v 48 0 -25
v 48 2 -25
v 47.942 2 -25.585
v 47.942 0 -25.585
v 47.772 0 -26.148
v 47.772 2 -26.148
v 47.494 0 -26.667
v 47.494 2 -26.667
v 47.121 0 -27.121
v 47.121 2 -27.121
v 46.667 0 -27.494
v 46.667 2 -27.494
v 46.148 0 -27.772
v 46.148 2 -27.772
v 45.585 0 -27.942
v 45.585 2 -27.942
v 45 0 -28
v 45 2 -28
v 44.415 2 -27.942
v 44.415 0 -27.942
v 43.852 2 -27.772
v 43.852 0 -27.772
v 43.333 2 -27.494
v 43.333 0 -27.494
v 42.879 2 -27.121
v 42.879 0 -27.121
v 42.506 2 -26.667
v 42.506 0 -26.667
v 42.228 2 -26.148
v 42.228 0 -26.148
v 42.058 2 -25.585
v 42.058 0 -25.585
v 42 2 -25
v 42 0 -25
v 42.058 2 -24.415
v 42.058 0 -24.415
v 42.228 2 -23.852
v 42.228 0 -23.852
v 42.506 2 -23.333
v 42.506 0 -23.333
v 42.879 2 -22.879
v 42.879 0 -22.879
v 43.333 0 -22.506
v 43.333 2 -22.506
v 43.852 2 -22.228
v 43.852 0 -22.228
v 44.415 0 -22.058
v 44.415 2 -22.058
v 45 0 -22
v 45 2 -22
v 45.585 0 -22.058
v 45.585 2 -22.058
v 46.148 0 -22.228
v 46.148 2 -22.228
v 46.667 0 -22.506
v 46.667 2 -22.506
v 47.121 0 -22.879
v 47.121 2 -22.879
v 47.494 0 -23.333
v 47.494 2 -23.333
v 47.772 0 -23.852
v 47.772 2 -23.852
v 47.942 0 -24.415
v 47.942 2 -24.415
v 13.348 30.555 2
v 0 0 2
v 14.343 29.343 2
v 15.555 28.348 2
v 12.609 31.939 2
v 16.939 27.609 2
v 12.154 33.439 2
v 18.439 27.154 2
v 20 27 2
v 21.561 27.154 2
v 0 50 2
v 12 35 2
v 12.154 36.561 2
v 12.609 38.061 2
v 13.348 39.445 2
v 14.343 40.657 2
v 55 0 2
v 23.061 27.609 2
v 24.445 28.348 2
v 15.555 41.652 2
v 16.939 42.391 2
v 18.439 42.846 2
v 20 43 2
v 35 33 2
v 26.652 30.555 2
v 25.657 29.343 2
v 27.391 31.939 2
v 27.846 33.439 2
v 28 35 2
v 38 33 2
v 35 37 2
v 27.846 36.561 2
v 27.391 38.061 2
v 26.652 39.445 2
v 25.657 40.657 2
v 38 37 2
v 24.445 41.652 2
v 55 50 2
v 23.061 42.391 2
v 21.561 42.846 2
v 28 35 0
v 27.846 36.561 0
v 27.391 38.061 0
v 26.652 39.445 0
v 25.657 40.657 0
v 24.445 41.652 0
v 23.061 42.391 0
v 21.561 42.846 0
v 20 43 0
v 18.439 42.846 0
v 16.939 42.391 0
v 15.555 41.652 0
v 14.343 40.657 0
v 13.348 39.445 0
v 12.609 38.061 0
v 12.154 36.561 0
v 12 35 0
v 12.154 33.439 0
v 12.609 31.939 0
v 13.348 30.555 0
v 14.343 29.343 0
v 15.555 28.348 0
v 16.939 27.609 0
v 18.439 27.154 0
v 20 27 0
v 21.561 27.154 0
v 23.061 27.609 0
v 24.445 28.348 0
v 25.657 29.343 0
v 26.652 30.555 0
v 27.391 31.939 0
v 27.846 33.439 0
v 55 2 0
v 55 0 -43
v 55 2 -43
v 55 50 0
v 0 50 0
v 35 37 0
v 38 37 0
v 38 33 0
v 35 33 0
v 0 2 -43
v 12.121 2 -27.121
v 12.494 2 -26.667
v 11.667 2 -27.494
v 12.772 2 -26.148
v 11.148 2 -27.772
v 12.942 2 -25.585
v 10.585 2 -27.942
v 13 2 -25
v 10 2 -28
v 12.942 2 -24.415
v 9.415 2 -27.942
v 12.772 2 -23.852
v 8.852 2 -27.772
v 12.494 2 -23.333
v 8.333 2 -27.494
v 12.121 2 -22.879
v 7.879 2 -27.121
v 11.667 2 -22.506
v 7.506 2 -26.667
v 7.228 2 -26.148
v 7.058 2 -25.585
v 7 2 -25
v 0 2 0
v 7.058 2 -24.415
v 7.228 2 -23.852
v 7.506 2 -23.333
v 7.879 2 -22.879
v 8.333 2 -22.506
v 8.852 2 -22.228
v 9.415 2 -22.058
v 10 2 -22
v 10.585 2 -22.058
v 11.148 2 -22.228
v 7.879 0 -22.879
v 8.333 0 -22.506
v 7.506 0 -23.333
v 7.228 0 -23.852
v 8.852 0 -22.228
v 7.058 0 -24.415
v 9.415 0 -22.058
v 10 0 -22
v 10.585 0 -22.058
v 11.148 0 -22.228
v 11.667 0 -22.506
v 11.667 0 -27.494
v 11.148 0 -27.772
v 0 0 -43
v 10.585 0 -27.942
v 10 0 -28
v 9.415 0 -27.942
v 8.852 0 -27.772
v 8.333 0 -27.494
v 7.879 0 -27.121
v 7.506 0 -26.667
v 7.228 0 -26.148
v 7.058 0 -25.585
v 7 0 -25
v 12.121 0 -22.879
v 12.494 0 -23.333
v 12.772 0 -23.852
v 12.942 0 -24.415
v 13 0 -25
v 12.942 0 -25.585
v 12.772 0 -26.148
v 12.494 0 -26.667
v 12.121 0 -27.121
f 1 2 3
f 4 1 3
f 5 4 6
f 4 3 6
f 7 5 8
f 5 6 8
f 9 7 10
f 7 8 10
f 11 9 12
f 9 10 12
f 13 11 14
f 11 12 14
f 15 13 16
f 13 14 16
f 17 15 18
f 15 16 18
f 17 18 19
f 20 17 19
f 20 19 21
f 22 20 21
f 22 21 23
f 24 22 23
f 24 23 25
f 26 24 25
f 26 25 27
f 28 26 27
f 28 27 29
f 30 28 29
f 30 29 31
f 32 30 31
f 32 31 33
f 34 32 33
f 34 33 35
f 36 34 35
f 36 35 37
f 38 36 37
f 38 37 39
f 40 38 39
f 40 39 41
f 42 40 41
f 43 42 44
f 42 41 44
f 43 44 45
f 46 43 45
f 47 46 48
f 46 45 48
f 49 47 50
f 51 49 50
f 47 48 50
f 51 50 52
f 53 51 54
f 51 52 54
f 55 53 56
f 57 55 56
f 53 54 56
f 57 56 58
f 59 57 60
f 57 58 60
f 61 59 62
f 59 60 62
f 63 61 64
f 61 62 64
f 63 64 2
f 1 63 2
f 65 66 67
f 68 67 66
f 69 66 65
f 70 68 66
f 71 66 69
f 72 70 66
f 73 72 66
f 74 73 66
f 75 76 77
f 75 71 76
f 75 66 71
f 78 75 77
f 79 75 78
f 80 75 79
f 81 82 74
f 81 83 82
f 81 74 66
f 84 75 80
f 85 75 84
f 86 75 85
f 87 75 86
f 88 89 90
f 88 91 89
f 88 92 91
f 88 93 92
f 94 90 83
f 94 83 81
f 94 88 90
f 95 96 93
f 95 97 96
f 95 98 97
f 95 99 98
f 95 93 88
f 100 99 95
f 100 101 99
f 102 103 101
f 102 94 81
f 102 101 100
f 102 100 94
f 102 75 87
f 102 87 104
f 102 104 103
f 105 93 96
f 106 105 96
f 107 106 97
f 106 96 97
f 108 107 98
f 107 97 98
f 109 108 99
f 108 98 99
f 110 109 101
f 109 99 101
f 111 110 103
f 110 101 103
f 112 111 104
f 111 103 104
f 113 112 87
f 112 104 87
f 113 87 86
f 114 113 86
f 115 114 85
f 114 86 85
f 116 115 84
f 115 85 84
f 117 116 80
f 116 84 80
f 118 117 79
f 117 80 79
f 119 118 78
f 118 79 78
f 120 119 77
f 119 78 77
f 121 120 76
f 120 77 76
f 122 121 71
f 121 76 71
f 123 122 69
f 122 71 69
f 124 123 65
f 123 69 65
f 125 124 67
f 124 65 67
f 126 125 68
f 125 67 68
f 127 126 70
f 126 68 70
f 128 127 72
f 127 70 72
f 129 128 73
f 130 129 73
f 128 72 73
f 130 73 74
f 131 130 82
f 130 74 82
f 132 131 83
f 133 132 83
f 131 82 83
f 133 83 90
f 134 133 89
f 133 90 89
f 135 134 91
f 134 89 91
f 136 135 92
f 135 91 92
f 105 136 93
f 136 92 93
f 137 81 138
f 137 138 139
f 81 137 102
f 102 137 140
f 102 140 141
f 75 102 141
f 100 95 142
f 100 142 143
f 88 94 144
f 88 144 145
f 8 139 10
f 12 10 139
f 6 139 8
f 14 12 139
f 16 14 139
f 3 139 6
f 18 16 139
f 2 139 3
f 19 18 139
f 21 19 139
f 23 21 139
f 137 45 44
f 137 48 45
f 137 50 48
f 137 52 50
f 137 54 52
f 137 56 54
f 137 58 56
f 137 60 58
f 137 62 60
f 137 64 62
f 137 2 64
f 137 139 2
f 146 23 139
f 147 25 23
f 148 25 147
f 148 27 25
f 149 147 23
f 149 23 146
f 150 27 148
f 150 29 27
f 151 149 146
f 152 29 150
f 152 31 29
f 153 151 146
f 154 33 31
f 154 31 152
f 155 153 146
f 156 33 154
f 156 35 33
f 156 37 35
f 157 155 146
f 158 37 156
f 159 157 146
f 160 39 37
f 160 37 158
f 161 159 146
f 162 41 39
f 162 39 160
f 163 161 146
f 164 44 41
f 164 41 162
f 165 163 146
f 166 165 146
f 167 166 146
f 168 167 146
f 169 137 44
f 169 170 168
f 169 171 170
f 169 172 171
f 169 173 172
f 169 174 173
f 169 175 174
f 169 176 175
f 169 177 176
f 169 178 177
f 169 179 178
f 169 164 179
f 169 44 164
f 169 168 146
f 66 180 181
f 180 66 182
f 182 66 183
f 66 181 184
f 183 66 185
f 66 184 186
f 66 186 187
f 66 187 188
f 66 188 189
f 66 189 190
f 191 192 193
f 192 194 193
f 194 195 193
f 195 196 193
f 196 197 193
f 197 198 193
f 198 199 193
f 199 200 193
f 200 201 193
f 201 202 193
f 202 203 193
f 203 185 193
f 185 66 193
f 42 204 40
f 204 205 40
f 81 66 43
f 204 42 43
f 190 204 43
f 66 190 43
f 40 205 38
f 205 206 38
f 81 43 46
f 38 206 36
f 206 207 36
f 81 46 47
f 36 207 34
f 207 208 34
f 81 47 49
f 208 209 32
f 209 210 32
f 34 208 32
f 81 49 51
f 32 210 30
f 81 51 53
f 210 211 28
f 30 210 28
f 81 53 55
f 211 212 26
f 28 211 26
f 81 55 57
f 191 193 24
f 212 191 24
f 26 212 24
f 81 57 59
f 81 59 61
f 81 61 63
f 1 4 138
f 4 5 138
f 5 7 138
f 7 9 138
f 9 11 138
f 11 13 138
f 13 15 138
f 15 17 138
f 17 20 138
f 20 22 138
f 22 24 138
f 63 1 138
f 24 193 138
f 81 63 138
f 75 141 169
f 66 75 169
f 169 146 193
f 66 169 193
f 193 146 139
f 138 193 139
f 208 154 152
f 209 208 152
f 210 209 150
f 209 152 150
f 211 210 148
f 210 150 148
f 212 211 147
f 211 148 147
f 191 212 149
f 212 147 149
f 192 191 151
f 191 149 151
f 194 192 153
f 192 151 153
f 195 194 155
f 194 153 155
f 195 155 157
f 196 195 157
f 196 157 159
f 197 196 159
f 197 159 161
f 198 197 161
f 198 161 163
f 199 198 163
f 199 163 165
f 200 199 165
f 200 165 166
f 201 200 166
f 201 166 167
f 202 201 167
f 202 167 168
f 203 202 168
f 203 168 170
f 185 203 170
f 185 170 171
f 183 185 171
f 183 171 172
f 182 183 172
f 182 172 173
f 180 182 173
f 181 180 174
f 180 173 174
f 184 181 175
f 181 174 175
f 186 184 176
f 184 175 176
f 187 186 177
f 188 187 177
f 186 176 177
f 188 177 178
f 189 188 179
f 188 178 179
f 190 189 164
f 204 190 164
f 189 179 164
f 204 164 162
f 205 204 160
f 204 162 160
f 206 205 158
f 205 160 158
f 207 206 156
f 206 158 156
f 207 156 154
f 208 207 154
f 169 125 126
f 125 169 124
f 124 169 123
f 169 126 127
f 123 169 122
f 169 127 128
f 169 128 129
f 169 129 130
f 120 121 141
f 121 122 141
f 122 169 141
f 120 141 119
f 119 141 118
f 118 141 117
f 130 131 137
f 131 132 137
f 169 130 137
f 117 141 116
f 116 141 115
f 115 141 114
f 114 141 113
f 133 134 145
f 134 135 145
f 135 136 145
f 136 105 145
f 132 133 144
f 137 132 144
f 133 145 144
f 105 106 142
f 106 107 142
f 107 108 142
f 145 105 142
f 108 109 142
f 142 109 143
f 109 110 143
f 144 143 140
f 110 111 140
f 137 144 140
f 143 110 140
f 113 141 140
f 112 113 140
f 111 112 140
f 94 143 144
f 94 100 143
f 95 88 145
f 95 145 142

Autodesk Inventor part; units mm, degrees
ref_plane "YZ Plane" through (0, 0, 0) normal (1, 0, 0) x (0, 1, 0)
ref_plane "XZ Plane" through (0, 0, 0) normal (0, 1, 0) x (-1, 0, 0)
ref_plane "XY Plane" through (0, 0, 0) normal (0, 0, 1) x (1, 0, 0)
sketch "Sketch1" plane through (0, 0, 0) normal (0, 0, 1) x (1, 0, 0)
  line L0 (0, 0) -> (55, 0)
  line L1 (55, 0) -> (55, 50)
  line L2 (55, 50) -> (0, 50)
  line L3 (0, 50) -> (0, 0)
  dimension "d3" = 55
  dimension "d4" = 50
extrude "Extrusion1" add sketch "Sketch1" along normal blind 2
sketch "Sketch2" plane through (0, 0, 2) normal (0, 0, 1) x (1, 0, 0)
  circle A0 centre (20, 35) radius 8
  line L0 (0, 0) -> (55, 0) projected
  line L1 (0, 50) -> (0, 0) projected
  line L2 (35, 37) -> (38, 37)
  line L3 (38, 37) -> (38, 33)
  line L4 (38, 33) -> (35, 33)
  line L5 (35, 33) -> (35, 37)
  dimension "d2" = 16
  dimension "d5" = 35
  dimension "d6" = 20
  dimension "d7" = 15
  dimension "d8" = 4
  dimension "d9" = 3
  dimension "d10" = 2
extrude "Extrusion2" cut sketch "Sketch2" against normal through all
sketch "Sketch4" plane through (0, 0, 2) normal (0, 0, 1) x (1, 0, 0)
  line L0 (0, 2) -> (0, 0)
  line L1 (0, 0) -> (55, 0)
  line L2 (55, 0) -> (55, 2)
  line L3 (55, 2) -> (0, 2)
  line L4 (0, 2) -> (0, 0)
  dimension "d26" = 2
  dimension "d27" = 55
extrude "Extrusion3" add sketch "Sketch4" against normal blind 45
sketch "Sketch6" plane through (0, 2, 0) normal (0, 1, 0) x (1, 0, 0)
  circle A0 centre (10, 25) radius 3
  circle A1 centre (45, 25) radius 3
  line L0 (0, 0) -> (0, 43) projected
  line L1 (55, 0) -> (55, 43) projected
  line L2 (0, 43) -> (55, 43) projected
  dimension "d28" = 6
  dimension "d29" = 6
  dimension "d30" = 10
  dimension "d31" = 10
  dimension "d32" = 18
  dimension "d33" = 18
extrude "Extrusion5" cut sketch "Sketch6" against normal through all
properties part number "POT mount" material "Nylon 6/6"
